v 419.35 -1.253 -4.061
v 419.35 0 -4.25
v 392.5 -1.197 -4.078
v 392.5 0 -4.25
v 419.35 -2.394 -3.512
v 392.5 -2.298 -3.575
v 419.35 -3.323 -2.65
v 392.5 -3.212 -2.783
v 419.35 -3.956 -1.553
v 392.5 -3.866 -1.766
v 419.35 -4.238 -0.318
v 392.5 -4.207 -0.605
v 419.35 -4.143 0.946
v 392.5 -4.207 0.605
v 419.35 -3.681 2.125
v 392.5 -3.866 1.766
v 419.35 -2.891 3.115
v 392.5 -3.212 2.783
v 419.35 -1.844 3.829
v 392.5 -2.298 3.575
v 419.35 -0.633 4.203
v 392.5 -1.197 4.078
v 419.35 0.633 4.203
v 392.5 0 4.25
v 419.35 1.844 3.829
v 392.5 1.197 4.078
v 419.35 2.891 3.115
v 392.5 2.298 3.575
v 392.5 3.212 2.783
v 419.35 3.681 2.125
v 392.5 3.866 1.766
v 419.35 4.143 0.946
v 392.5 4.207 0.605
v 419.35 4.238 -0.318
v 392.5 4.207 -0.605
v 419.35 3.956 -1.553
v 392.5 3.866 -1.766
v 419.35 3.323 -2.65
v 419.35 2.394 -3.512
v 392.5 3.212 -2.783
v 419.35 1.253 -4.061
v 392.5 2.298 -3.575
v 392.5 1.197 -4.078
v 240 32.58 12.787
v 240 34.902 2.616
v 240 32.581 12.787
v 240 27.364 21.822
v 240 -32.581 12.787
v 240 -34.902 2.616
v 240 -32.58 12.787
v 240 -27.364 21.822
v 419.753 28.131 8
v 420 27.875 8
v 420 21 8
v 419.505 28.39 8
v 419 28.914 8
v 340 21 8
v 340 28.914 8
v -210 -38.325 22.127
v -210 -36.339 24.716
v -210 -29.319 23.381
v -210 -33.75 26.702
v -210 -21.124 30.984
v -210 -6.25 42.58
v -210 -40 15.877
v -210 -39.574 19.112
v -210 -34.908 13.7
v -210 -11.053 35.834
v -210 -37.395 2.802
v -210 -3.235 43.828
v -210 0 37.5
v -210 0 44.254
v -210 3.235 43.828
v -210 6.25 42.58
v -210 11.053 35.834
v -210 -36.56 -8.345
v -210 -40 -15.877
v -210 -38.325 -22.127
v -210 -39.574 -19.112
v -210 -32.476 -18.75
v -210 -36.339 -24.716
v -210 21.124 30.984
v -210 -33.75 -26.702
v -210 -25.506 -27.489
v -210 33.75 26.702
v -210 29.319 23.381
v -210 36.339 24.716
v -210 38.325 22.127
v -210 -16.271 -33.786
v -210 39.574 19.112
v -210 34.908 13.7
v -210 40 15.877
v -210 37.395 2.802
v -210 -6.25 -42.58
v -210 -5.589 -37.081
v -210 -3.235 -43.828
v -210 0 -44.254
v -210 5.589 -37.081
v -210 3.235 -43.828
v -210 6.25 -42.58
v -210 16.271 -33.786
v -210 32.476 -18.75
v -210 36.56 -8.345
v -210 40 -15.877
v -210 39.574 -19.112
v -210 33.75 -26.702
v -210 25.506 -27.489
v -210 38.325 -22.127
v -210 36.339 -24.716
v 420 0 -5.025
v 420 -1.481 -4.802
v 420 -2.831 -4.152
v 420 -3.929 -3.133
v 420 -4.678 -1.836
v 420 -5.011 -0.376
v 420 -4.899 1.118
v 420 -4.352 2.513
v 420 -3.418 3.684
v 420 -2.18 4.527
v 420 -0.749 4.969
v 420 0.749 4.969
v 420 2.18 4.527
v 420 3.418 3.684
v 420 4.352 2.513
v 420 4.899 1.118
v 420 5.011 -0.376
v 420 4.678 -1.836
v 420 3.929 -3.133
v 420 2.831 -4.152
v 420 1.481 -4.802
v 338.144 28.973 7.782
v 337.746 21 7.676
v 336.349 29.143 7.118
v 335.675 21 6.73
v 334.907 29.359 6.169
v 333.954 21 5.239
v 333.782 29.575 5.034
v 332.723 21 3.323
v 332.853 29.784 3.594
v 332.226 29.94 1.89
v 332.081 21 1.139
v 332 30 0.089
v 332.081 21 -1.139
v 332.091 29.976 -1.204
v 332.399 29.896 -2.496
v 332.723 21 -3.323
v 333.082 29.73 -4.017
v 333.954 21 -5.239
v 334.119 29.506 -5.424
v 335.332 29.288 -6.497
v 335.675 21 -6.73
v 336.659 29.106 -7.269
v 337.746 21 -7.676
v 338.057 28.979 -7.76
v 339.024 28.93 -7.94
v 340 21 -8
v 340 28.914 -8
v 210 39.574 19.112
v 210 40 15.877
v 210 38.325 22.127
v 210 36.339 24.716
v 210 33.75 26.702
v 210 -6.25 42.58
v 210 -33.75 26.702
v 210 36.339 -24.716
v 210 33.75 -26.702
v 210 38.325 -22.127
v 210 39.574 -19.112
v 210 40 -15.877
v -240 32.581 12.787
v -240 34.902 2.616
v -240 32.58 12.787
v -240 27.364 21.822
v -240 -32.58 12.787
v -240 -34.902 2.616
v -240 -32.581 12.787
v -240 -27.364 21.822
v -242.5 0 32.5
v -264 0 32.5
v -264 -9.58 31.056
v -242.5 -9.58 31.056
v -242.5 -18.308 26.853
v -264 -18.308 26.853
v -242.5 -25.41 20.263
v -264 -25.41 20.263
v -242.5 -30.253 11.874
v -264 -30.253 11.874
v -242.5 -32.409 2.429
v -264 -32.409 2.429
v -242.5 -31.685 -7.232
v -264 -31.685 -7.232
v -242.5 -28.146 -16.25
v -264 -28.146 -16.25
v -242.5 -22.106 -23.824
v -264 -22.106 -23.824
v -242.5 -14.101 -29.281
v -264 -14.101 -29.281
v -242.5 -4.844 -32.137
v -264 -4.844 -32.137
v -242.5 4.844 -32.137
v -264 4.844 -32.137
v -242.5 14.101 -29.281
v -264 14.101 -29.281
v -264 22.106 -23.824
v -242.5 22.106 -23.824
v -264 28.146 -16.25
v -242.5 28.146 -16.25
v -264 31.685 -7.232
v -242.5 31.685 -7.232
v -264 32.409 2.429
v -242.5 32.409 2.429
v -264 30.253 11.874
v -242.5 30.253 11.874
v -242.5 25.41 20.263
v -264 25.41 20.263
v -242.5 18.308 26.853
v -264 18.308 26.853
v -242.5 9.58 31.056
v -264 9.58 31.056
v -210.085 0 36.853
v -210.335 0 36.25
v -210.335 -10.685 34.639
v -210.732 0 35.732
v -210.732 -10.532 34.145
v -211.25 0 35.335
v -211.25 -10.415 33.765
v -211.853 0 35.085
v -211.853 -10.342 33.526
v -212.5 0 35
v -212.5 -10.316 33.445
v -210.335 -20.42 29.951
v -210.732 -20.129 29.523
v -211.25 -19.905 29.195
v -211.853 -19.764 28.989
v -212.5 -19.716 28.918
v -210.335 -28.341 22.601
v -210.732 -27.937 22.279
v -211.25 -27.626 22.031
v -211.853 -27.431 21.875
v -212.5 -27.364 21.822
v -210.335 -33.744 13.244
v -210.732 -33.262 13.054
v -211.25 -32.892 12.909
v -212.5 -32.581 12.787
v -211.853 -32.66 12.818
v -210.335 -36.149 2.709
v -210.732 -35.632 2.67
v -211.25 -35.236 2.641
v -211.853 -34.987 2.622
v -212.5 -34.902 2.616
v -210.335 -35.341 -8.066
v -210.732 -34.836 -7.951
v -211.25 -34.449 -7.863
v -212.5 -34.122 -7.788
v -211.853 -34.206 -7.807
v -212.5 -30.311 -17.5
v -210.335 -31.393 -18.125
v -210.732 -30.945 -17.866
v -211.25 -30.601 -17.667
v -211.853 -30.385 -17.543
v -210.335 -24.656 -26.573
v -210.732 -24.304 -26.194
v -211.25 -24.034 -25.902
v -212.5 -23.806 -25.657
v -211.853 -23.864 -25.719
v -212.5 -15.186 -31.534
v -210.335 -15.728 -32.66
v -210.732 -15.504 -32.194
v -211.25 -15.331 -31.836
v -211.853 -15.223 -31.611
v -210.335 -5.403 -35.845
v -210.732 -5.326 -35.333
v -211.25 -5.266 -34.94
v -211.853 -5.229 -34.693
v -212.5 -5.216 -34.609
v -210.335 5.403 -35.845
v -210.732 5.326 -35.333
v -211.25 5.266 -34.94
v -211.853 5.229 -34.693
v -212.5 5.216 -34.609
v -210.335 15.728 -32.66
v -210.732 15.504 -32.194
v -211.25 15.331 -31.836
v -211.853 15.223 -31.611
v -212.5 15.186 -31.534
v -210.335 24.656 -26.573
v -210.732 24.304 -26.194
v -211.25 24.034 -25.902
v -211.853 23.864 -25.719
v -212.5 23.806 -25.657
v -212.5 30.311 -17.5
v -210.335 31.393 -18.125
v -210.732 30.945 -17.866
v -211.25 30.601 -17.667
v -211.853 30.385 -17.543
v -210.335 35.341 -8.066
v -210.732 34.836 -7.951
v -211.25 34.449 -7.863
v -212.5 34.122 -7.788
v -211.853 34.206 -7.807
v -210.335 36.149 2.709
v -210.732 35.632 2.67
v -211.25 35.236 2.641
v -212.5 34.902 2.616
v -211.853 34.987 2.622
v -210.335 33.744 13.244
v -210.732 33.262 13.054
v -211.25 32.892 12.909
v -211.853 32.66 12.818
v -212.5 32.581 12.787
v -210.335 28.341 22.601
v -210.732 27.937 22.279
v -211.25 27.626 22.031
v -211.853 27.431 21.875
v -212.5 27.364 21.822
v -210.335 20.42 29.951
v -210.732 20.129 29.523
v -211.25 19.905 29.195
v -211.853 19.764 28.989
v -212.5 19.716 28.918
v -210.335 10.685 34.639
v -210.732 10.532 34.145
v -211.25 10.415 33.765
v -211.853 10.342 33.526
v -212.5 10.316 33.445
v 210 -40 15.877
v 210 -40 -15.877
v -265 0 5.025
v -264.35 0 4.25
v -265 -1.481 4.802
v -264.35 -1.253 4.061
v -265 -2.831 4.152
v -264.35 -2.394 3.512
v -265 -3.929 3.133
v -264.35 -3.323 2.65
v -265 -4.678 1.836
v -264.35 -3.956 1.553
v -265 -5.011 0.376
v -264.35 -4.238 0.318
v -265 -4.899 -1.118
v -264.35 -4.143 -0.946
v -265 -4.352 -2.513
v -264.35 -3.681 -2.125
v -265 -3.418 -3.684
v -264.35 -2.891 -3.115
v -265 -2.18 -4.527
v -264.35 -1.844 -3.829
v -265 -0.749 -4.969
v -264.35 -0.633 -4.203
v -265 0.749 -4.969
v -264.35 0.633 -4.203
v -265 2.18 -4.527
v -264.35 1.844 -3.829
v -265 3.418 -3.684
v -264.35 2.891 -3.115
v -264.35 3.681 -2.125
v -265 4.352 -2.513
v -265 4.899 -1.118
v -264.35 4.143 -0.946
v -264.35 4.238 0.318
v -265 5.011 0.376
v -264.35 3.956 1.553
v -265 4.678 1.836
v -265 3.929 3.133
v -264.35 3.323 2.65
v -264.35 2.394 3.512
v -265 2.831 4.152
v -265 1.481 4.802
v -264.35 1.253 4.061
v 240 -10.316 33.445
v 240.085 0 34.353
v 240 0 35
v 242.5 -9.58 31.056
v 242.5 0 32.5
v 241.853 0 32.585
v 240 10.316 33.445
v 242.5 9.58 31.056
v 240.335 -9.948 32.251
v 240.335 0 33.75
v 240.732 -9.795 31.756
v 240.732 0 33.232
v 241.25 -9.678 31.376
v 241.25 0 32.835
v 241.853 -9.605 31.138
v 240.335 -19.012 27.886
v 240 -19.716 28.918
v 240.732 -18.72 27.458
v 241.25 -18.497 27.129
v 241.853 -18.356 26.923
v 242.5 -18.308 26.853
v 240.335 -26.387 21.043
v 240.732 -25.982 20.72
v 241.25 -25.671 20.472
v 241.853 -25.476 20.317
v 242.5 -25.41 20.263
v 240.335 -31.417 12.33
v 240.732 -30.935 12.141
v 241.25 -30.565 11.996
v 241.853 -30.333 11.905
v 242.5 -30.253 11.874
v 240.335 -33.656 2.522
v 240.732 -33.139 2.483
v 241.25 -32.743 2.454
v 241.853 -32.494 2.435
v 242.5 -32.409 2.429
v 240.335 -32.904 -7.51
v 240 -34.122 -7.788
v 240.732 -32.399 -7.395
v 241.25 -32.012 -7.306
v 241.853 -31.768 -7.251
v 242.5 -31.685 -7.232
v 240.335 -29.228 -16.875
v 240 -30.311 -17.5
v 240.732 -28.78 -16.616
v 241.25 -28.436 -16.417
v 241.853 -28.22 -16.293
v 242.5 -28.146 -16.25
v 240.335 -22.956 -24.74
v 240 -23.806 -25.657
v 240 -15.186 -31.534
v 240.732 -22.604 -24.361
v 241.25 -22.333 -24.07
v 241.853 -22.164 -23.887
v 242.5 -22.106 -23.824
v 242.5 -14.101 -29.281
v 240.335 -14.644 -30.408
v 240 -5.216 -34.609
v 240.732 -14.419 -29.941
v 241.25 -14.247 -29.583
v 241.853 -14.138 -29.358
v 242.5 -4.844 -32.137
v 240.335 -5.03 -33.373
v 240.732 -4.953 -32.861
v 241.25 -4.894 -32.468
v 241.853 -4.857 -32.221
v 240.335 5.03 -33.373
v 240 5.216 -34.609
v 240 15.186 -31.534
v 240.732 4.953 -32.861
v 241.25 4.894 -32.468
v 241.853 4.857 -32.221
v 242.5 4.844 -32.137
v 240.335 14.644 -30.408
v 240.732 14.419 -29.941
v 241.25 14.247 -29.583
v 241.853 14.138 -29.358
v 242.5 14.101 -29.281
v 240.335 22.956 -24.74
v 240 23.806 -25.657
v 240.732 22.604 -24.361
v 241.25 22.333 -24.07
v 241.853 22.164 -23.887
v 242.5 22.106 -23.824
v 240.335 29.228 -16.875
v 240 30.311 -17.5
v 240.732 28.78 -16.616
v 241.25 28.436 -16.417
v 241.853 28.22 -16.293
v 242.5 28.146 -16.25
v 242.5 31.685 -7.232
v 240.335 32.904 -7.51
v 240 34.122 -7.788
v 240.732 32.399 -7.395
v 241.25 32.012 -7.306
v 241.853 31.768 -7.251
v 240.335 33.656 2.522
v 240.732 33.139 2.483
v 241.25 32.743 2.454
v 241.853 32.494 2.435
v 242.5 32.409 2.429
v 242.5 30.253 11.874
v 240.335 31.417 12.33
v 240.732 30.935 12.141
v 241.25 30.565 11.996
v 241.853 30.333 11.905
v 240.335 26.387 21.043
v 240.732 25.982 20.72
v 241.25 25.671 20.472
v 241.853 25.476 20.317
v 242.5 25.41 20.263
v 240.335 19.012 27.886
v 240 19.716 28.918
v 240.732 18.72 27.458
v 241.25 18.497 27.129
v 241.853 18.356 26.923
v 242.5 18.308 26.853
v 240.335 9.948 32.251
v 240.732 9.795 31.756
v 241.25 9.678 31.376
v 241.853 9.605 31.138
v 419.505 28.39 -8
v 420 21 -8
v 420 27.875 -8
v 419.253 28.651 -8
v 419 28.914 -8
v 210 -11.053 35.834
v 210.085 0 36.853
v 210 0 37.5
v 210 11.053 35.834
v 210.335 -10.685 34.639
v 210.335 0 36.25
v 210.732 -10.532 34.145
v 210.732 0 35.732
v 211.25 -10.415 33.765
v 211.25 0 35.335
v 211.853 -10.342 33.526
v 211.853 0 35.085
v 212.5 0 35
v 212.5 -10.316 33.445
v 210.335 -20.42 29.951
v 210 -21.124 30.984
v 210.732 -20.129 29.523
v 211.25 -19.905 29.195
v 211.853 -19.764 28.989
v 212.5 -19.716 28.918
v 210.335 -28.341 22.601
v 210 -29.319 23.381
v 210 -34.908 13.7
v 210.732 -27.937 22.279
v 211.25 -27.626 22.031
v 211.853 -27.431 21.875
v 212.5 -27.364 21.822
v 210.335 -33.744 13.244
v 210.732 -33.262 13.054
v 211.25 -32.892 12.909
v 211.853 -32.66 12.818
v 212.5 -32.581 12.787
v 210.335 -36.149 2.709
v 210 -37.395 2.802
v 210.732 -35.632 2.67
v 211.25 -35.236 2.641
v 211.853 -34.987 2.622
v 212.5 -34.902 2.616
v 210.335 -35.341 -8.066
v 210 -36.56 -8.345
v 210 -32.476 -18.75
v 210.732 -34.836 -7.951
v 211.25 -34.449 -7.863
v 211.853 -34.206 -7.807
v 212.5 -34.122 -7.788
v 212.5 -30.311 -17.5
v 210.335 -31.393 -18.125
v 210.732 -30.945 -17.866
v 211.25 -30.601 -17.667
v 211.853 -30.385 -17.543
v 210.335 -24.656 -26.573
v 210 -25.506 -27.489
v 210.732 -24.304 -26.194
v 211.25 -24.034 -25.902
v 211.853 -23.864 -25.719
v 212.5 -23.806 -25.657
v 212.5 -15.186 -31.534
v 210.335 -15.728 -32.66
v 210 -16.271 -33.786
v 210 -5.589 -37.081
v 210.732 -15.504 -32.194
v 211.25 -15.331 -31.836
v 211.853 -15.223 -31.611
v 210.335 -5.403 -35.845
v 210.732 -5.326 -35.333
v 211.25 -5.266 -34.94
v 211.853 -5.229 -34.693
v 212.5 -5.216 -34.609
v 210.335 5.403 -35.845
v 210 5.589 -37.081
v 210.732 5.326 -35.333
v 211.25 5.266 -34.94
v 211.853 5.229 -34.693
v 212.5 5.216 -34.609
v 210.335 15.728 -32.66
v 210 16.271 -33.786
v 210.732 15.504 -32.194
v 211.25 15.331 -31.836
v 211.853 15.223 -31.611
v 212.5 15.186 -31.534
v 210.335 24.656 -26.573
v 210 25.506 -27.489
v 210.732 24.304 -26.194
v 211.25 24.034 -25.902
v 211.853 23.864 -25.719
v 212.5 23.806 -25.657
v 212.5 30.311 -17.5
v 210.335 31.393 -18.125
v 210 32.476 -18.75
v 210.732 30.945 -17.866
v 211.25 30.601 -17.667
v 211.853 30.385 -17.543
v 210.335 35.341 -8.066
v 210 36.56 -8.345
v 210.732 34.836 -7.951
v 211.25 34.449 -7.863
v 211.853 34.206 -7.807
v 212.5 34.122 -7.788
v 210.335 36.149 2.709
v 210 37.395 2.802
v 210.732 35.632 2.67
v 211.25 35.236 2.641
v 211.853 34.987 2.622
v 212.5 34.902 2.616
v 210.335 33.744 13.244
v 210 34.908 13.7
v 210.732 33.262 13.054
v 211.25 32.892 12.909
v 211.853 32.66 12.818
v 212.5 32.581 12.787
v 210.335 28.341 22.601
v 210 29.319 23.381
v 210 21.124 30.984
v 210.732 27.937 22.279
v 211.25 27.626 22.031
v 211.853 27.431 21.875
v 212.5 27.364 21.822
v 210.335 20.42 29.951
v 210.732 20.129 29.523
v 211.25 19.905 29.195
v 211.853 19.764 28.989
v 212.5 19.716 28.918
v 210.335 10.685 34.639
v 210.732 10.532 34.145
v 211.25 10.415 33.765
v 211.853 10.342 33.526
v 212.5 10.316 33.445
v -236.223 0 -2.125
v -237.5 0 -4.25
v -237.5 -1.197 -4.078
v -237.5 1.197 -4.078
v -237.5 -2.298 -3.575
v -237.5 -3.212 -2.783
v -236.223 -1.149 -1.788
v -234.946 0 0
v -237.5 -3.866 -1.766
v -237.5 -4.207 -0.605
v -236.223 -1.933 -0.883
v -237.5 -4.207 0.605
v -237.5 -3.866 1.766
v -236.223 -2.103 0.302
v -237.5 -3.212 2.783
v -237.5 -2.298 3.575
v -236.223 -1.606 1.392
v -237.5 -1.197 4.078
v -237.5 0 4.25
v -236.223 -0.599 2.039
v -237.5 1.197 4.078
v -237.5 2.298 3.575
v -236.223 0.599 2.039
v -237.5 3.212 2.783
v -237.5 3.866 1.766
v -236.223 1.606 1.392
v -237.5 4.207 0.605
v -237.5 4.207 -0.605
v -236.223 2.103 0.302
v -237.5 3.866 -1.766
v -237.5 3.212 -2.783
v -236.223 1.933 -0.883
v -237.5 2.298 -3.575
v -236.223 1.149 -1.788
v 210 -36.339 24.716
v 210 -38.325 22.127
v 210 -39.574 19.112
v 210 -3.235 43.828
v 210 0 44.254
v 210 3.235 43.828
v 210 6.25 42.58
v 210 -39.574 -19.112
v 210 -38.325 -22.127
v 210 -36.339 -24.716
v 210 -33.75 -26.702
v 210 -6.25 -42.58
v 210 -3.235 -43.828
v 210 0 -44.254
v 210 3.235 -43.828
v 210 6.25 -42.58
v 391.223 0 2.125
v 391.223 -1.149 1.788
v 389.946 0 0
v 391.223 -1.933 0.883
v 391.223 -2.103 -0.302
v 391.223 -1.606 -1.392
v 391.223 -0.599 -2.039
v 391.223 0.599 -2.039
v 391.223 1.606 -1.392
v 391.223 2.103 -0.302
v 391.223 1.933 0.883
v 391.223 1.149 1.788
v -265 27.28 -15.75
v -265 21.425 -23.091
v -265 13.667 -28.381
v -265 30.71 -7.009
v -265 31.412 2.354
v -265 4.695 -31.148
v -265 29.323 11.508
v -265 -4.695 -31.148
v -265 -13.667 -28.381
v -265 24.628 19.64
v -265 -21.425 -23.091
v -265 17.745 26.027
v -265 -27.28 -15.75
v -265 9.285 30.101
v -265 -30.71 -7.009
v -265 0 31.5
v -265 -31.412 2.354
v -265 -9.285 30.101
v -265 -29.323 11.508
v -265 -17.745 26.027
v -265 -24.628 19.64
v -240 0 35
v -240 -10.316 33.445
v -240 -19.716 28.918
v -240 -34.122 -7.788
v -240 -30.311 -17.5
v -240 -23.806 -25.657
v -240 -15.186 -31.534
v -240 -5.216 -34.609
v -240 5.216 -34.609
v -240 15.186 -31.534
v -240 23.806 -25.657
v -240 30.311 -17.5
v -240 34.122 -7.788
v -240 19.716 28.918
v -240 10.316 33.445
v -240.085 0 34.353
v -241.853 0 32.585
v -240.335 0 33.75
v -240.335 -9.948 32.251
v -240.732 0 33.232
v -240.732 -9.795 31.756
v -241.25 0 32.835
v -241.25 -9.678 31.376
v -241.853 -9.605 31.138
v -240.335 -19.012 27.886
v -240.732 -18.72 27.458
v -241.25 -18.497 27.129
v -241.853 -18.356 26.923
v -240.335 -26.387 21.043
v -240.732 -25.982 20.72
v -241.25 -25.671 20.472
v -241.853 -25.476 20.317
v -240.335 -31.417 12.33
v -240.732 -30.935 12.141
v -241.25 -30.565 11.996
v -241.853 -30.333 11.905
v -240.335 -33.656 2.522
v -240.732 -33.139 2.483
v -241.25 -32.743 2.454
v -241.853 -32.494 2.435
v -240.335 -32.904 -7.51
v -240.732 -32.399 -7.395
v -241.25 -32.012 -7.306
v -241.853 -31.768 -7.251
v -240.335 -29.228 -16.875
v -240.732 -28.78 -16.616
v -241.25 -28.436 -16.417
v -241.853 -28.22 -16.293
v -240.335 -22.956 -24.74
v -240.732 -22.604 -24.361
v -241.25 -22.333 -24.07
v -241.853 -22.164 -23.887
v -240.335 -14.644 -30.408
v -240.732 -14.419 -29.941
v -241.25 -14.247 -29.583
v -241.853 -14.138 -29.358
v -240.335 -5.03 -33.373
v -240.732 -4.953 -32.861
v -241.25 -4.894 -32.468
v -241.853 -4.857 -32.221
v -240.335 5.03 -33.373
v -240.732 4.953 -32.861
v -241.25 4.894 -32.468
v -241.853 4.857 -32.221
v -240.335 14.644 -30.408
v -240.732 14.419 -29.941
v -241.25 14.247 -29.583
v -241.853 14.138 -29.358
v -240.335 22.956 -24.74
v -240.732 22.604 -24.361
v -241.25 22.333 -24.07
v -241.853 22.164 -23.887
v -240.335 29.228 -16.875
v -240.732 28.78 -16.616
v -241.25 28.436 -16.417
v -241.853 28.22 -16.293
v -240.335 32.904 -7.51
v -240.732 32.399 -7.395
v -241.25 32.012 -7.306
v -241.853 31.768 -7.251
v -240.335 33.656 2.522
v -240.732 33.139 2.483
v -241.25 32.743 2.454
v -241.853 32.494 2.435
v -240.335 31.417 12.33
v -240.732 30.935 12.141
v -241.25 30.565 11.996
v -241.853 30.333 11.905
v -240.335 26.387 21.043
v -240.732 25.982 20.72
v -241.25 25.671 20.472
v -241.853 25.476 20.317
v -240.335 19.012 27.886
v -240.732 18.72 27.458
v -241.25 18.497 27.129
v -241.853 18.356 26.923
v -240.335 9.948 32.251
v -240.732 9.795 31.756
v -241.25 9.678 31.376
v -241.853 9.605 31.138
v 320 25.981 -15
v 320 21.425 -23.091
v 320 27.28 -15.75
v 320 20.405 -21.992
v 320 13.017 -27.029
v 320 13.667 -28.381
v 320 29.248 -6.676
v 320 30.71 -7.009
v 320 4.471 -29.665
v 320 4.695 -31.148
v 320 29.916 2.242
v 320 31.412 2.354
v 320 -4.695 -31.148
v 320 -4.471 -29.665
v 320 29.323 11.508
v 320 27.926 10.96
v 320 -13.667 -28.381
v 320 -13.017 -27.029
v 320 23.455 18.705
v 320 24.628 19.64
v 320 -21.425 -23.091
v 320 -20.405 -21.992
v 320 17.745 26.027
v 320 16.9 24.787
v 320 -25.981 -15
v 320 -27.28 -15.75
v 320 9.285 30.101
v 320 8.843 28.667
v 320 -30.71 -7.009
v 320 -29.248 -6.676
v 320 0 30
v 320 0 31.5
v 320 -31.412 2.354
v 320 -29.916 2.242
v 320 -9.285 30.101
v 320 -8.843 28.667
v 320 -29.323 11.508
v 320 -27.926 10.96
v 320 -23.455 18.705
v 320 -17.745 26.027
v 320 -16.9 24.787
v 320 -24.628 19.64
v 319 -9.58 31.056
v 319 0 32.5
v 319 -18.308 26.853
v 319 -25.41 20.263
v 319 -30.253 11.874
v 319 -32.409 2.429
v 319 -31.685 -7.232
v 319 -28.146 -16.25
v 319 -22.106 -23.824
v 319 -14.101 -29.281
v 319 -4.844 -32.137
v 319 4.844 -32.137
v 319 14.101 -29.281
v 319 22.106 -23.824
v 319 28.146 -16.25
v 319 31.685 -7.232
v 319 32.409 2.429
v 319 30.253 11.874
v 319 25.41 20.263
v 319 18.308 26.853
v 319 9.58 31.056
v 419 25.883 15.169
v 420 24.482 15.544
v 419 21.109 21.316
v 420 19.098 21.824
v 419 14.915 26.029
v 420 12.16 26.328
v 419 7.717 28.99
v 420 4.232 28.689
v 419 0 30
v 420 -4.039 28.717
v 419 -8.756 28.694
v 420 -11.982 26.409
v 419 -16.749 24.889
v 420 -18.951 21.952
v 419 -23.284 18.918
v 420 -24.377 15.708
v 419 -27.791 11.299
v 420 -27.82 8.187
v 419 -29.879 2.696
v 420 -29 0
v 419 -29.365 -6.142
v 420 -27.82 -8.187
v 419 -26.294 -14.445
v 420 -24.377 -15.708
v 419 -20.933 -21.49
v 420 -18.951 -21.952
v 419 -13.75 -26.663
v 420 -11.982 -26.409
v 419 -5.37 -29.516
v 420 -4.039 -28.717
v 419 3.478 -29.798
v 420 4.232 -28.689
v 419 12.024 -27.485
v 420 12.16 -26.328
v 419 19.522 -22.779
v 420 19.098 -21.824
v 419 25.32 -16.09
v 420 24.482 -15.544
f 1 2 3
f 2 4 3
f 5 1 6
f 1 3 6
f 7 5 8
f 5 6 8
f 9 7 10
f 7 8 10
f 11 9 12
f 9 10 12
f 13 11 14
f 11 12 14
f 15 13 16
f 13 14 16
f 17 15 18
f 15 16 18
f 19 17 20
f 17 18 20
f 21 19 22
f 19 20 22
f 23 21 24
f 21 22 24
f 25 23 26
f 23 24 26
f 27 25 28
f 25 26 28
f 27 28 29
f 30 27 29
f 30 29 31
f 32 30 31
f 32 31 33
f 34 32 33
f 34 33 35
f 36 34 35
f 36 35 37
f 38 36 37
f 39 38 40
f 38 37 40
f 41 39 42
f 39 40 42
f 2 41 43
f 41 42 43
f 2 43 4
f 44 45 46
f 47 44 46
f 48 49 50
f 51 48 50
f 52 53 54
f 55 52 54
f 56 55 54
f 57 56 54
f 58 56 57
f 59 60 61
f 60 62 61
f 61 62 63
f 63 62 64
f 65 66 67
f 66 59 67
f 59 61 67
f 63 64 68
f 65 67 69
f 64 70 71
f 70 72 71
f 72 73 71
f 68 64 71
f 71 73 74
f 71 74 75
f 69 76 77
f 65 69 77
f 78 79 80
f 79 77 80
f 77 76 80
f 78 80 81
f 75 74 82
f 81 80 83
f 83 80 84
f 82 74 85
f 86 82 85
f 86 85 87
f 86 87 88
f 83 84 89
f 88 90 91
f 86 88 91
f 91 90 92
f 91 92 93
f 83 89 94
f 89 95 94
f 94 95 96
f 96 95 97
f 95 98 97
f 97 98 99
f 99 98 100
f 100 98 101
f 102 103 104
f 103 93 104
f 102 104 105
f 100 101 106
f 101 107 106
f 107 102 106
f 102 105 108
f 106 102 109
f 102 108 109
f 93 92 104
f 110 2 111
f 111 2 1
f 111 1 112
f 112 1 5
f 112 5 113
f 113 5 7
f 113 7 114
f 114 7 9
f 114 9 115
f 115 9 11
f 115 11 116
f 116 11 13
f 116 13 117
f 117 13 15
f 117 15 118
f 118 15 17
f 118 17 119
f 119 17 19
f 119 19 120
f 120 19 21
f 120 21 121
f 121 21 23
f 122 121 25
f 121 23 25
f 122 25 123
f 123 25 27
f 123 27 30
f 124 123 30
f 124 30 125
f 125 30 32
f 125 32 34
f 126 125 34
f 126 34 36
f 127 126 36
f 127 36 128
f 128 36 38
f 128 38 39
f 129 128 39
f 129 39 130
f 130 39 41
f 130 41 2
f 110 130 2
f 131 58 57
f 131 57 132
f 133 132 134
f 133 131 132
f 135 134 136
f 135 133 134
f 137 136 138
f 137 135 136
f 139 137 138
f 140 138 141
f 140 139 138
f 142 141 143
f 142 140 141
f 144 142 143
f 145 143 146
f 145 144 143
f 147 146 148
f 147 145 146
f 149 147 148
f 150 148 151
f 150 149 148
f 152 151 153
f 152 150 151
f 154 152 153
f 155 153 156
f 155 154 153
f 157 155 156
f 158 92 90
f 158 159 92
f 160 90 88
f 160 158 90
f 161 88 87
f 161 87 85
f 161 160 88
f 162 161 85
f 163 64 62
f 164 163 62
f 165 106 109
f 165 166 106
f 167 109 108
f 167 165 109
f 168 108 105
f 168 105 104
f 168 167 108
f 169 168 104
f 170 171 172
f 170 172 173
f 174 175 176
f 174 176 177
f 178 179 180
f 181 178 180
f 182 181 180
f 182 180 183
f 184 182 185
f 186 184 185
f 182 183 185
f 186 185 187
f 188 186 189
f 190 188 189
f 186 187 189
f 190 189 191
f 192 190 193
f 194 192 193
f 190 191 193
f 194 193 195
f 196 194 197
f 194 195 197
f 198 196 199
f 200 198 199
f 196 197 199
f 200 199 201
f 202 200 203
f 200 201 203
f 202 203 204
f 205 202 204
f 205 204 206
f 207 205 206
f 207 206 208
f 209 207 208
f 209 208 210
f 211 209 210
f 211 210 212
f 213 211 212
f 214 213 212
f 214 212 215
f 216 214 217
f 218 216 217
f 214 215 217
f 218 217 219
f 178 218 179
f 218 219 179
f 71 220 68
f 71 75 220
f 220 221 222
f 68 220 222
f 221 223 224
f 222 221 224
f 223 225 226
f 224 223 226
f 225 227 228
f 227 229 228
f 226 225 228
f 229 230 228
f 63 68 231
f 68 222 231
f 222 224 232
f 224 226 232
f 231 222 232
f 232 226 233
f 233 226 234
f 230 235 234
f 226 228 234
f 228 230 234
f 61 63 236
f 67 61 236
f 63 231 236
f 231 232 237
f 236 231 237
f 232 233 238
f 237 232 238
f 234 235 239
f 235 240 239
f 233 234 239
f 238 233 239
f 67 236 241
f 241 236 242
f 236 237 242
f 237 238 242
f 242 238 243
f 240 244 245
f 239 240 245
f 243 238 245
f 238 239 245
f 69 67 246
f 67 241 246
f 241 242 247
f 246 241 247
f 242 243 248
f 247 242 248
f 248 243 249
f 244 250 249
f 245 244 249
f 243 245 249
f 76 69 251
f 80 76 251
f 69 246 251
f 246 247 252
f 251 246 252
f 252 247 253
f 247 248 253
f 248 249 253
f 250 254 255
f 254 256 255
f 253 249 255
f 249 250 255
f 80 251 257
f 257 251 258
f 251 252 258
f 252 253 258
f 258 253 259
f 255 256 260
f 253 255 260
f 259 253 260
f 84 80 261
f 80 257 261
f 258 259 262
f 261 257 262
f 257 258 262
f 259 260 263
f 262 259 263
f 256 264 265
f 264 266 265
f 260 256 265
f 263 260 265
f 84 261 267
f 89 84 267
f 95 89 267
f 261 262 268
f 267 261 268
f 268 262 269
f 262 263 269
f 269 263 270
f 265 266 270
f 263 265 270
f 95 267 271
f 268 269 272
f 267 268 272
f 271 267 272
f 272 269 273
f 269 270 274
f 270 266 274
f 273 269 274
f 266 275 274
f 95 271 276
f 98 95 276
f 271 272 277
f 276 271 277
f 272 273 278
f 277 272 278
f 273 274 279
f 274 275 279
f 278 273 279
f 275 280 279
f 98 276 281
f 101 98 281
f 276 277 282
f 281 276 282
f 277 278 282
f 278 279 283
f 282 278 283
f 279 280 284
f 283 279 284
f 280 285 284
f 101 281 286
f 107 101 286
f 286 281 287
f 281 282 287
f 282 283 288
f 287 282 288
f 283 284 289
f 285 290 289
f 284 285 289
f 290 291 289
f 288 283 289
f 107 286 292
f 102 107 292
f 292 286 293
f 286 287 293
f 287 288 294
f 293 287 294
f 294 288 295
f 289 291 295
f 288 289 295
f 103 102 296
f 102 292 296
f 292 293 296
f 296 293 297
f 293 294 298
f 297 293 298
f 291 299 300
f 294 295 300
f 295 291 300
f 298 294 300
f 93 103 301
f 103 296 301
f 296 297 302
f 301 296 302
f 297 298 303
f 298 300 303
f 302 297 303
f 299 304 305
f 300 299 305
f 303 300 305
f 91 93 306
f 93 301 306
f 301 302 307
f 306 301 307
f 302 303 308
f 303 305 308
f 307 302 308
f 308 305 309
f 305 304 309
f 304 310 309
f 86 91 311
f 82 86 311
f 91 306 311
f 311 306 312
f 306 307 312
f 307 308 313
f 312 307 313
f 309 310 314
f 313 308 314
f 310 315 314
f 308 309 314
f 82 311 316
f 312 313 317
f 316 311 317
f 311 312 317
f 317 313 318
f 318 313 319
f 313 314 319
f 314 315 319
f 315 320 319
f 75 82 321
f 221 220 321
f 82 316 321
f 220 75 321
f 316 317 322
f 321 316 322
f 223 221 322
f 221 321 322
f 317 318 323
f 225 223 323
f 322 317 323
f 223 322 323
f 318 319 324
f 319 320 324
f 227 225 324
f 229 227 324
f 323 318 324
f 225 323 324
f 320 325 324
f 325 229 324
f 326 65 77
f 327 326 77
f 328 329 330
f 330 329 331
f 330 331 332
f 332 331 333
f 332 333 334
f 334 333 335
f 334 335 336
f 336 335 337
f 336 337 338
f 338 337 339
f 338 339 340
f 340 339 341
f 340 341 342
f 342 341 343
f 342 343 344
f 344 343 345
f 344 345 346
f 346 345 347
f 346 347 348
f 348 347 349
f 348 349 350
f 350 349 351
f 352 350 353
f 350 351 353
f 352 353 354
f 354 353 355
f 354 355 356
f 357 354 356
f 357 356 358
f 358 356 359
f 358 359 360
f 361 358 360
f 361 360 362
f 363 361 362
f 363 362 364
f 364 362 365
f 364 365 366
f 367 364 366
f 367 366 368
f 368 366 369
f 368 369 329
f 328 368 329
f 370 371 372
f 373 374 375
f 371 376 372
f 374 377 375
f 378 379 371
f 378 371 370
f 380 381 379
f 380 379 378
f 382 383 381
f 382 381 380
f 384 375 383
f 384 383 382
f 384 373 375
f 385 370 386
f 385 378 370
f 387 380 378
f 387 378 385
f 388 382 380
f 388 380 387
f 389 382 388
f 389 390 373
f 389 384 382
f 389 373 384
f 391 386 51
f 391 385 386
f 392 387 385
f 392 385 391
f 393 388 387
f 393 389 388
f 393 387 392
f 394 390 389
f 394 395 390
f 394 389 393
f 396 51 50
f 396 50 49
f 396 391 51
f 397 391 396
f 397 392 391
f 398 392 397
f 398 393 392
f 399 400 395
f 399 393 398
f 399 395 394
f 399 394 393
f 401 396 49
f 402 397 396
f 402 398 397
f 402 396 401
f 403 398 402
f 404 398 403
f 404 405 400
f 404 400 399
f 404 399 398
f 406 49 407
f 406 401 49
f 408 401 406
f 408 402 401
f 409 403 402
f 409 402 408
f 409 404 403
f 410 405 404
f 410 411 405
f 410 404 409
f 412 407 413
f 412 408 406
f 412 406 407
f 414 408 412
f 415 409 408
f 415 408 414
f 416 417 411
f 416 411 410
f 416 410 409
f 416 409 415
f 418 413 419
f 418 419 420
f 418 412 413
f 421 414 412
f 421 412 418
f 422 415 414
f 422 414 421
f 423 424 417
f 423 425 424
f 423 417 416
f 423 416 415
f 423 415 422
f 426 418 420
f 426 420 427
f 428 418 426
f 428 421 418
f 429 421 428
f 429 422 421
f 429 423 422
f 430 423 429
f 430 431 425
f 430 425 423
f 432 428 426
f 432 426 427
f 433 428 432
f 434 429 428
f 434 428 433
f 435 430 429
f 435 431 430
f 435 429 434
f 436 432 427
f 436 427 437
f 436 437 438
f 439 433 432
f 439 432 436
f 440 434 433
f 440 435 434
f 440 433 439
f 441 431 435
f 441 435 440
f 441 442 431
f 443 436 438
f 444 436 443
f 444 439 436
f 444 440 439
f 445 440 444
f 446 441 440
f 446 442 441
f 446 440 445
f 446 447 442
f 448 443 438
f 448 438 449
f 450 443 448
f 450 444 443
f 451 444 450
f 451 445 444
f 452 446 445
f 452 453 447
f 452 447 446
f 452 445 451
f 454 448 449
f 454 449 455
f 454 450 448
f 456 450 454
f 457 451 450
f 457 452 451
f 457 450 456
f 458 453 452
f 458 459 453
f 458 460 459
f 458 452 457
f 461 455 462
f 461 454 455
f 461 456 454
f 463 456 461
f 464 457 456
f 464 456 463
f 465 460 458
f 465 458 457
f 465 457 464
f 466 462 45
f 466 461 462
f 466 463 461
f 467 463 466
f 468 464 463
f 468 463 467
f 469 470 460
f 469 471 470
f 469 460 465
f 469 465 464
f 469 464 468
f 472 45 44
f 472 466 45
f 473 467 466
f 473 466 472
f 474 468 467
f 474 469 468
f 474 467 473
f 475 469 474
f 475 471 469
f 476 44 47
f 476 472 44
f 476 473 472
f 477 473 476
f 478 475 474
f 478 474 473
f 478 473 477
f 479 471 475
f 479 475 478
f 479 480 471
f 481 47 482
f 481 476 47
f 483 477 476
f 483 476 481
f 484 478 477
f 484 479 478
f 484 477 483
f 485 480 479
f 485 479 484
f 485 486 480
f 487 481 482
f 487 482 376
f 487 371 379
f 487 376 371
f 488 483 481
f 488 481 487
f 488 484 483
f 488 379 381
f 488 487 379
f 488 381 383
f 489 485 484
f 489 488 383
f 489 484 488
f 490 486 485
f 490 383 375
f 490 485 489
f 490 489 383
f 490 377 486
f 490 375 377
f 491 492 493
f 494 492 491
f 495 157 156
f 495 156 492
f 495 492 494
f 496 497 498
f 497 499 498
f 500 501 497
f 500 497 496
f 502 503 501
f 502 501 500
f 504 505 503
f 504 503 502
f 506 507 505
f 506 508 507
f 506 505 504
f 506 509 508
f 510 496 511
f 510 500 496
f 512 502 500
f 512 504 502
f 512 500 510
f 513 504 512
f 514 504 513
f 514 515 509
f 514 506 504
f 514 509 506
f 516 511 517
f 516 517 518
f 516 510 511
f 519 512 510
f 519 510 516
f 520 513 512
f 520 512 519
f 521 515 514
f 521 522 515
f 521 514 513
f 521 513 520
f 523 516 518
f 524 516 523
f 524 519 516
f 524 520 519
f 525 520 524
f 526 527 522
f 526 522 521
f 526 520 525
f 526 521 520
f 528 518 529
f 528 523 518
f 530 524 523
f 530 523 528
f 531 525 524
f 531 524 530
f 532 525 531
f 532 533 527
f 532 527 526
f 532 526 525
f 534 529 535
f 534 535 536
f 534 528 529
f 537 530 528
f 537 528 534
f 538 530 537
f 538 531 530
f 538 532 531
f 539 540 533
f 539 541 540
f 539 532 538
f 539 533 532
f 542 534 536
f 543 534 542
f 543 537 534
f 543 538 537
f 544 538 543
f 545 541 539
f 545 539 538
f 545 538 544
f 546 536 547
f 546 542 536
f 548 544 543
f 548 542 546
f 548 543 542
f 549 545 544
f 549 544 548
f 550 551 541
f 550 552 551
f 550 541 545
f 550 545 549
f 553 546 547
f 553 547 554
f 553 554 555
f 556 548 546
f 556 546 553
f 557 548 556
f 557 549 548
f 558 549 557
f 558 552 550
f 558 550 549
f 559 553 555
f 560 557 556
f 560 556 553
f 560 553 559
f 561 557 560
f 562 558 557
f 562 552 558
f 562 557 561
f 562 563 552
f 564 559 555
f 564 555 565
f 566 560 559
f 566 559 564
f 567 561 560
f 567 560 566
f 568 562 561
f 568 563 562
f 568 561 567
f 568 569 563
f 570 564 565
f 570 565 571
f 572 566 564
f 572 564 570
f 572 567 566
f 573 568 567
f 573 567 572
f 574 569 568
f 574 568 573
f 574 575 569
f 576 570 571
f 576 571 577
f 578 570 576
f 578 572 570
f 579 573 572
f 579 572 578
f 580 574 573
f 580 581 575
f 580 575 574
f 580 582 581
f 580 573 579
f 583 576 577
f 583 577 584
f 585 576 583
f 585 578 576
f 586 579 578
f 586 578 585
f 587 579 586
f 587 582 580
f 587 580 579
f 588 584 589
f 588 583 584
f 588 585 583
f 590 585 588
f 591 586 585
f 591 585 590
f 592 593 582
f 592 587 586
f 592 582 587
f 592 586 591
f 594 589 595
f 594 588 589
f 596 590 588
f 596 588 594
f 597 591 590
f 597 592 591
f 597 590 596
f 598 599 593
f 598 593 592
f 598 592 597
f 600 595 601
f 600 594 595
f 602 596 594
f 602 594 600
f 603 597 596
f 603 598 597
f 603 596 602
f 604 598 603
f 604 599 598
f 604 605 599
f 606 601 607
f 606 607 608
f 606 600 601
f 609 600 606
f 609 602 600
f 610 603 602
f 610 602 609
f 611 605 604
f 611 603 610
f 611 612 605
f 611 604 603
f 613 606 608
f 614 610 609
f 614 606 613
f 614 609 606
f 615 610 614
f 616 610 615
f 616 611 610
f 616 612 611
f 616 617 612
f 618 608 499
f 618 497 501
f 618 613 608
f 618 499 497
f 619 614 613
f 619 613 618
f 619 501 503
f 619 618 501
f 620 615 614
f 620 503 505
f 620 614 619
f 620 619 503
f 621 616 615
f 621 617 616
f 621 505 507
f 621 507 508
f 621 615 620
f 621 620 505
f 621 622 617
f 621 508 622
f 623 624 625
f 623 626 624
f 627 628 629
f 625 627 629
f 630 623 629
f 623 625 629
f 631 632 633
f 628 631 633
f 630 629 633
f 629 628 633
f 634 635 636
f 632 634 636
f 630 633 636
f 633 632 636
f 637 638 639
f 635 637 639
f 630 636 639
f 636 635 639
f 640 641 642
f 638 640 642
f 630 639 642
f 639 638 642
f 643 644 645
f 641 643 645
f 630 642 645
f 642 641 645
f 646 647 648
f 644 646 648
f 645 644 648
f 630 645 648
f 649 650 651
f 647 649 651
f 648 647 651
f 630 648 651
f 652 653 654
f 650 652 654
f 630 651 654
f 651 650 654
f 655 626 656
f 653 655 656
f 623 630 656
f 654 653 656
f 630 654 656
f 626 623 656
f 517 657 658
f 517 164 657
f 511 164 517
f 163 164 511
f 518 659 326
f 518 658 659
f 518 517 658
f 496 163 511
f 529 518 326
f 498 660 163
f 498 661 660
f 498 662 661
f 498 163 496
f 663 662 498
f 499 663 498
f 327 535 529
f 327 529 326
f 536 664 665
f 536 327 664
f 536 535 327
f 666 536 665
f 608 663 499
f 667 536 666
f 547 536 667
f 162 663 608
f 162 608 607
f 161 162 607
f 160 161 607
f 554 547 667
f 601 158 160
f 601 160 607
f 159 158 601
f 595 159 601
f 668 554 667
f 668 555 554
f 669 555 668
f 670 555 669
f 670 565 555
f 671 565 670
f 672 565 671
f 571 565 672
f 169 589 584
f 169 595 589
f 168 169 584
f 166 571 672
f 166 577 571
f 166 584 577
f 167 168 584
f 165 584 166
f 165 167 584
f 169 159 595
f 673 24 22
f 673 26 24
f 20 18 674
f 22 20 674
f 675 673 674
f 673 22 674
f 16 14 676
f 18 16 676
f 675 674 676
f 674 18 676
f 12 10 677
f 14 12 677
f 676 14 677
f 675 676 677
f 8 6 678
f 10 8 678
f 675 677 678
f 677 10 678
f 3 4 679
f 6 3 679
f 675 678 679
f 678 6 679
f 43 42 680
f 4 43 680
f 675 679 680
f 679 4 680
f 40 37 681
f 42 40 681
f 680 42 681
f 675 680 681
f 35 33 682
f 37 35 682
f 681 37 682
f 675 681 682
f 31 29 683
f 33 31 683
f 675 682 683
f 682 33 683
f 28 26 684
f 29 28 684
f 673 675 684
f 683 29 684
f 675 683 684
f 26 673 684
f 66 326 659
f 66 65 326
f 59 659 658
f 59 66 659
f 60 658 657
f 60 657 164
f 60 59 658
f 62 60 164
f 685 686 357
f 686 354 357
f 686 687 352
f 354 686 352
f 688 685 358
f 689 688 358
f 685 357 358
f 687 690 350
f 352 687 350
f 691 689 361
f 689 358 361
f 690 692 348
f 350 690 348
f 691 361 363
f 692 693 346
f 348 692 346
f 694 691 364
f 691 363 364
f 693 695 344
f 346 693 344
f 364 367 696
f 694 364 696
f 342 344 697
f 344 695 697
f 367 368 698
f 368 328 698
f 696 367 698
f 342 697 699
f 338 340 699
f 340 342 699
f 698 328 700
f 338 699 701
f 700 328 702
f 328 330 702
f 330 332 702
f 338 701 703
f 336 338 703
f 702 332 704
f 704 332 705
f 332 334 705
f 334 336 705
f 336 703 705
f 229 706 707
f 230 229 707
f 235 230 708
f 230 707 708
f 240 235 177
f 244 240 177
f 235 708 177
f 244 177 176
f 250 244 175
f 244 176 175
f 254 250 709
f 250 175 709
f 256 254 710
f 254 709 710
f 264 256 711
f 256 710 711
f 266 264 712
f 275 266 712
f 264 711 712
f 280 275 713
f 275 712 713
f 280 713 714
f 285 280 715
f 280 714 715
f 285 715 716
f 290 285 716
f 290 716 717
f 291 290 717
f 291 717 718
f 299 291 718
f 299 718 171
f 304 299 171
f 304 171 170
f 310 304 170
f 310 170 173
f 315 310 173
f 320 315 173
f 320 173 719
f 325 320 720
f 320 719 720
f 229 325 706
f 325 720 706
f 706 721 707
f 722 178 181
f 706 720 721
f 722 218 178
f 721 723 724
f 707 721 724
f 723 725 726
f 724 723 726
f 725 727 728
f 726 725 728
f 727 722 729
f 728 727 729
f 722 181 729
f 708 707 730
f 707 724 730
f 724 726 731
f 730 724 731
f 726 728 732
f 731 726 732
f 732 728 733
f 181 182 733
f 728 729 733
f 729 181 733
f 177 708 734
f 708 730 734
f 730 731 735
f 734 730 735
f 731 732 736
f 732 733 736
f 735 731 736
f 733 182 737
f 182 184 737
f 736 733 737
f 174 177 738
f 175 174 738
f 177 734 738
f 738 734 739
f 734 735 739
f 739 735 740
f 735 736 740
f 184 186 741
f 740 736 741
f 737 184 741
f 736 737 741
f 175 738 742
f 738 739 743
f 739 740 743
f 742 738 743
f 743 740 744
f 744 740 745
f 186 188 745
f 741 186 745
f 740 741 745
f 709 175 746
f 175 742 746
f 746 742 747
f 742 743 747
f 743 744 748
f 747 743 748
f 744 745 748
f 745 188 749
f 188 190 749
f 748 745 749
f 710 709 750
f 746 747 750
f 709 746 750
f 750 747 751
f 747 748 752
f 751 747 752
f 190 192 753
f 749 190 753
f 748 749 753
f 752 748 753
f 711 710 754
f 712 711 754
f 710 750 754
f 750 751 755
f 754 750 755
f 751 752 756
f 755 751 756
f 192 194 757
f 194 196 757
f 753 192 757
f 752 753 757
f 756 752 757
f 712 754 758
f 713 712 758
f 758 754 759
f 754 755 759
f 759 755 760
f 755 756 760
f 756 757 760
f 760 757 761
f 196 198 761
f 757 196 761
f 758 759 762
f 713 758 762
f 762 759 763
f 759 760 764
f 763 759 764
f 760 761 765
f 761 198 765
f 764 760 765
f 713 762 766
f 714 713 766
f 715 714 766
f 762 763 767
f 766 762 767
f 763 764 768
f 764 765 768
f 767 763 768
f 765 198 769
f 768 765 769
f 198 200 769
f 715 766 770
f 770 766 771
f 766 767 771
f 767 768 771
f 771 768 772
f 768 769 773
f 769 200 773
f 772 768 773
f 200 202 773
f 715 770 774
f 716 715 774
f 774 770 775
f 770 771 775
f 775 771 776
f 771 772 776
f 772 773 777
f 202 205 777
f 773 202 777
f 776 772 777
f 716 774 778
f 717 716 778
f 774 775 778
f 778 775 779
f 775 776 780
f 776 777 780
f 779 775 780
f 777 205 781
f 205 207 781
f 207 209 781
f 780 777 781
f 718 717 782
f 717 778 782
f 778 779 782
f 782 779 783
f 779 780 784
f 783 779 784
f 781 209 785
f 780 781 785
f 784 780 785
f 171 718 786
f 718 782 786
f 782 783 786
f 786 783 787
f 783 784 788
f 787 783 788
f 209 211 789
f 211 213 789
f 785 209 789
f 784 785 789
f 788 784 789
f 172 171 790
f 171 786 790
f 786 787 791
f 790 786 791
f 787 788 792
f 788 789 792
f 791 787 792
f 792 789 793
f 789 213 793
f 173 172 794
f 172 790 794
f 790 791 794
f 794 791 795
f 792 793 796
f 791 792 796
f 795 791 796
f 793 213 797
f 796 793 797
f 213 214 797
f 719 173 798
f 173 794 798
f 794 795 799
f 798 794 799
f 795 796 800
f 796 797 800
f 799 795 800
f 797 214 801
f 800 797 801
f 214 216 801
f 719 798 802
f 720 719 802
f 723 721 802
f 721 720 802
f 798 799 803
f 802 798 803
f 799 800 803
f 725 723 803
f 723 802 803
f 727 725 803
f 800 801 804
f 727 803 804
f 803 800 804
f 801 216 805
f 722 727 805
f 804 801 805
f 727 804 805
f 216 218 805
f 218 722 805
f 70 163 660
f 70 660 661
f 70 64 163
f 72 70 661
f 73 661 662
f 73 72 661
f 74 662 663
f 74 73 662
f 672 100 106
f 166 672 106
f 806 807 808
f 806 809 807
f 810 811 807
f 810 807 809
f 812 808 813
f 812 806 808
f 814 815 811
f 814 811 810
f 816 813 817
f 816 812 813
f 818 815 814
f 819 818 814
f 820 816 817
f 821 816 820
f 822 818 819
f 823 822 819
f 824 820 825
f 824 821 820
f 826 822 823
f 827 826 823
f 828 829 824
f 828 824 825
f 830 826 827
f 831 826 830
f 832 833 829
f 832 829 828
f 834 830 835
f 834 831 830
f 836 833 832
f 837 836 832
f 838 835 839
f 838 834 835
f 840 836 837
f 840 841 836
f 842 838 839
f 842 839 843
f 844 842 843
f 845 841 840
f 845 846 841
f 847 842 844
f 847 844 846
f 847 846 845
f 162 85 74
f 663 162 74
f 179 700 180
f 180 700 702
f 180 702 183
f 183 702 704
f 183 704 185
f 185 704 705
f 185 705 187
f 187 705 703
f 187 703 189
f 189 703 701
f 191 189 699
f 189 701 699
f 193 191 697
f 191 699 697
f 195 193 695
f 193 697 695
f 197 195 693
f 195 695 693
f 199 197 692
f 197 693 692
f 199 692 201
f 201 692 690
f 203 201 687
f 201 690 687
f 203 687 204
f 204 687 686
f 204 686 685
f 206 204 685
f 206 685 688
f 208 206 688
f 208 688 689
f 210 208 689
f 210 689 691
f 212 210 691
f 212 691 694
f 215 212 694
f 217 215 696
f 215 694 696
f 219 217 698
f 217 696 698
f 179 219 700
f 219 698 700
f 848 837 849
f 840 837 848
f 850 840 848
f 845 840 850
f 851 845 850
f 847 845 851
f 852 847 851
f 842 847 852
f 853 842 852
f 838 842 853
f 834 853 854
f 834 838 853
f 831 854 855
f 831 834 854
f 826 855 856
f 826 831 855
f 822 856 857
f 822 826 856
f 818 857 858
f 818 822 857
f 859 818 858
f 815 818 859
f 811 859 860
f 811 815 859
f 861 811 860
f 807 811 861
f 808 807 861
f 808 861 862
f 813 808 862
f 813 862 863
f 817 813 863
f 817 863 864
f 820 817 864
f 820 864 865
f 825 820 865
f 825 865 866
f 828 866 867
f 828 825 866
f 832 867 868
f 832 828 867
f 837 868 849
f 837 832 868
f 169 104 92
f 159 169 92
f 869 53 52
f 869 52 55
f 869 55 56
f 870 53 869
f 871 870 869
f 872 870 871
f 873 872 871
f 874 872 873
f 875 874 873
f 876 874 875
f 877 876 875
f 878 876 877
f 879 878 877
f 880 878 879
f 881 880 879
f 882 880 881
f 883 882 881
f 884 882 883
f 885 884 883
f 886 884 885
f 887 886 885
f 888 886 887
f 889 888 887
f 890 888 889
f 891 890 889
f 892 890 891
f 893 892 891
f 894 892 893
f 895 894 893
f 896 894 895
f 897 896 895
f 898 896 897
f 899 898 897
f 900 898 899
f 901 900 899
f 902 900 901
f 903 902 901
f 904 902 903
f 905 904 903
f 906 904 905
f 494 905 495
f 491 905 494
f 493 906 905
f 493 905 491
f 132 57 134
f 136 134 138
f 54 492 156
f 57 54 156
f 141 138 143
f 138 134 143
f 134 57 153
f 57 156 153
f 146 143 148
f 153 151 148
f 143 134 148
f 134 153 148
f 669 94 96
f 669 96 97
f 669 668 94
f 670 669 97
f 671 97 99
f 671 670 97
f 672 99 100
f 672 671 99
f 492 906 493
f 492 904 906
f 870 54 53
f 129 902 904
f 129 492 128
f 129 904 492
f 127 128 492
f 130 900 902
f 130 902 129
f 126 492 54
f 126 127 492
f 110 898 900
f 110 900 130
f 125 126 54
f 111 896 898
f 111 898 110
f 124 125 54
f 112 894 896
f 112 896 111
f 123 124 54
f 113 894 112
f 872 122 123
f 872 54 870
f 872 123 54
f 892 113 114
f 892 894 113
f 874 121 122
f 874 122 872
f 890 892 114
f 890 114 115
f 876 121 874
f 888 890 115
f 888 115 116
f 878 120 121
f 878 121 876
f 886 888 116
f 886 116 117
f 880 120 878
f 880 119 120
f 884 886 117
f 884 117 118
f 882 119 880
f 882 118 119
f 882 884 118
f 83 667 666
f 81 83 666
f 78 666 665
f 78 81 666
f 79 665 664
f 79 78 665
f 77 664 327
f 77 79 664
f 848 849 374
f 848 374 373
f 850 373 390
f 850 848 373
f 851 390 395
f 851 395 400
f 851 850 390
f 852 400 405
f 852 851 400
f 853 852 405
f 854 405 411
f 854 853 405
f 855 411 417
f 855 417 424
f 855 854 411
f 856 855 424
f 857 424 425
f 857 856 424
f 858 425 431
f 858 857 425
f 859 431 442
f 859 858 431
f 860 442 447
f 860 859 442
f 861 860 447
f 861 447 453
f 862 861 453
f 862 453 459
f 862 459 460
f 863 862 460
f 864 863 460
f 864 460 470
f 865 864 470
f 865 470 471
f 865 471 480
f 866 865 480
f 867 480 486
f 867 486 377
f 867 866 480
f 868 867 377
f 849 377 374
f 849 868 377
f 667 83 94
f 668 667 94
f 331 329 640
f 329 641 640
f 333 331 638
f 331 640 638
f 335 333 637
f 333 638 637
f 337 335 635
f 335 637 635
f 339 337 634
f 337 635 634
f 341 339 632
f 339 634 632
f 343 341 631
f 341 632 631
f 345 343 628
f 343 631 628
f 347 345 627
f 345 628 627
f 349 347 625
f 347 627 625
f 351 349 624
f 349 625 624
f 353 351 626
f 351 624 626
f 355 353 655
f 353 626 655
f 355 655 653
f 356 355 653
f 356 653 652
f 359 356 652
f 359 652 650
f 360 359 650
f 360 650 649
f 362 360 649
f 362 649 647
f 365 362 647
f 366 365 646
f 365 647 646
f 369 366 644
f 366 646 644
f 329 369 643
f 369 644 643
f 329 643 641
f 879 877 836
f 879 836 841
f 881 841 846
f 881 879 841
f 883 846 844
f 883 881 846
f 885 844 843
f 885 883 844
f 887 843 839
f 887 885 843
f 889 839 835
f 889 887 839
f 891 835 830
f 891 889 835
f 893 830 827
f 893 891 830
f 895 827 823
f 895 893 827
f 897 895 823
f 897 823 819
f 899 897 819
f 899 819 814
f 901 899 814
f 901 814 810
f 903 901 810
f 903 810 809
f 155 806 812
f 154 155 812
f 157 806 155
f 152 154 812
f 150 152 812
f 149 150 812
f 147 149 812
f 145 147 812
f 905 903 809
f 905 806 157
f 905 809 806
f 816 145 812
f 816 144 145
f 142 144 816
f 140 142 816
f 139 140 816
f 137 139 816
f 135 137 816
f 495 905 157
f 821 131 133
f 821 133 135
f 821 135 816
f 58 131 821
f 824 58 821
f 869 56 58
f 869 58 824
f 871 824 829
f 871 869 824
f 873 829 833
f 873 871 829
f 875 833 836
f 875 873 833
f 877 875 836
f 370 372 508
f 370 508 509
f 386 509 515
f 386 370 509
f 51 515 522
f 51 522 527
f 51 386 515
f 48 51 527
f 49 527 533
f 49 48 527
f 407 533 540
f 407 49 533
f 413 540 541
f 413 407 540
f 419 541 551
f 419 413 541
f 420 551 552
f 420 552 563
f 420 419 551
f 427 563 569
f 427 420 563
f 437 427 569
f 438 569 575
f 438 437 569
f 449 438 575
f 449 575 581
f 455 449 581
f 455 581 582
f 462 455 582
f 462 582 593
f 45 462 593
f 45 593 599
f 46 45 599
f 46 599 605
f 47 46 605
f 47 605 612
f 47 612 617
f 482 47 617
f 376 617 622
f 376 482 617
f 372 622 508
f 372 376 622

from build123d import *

# Parameters (mm, degrees)
BOSS_EXTRUDE3_DEPTH                    = 210
FILLET1_R                              = 2.5
FILLET2_R                              = 12.5
CHAMFER1_SIZE                          = 1
M10_TAPPED_HOLE1_D                     = 8.5
M10_TAPPED_HOLE1_DEPTH                 = 27.5
M10_TAPPED_HOLE1_CSINK_D               = 10.05
M10_TAPPED_HOLE1_CSINK_ANGLE           = 100
M10_TAPPED_HOLE1_TIP                   = 2.553657631
M10_TAPPED_HOLE1_ON_FACE_2_D           = 8.5
M10_TAPPED_HOLE1_ON_FACE_2_DEPTH       = 27.5
M10_TAPPED_HOLE1_ON_FACE_2_CSINK_D     = 10.05
M10_TAPPED_HOLE1_ON_FACE_2_CSINK_ANGLE = 100
M10_TAPPED_HOLE1_ON_FACE_2_TIP         = 2.553657631
CUT_EXTRUDE1_DEPTH                     = 9


with BuildPart() as part:
    # Sketch1 → Boss-Extrude3 (new, symmetric)
    with BuildSketch(Plane(origin=(0, 0, 0), x_dir=(0, 0, -1), z_dir=(1, 0, 0))):
        Polygon((23.094010768, -40), (46.188021535, 0), (23.094010768, 40), (-23.094010768, 40), (-46.188021535, 0), (-23.094010768, -40), align=None)
    extrude(amount=BOSS_EXTRUDE3_DEPTH, both=True)

    # Sketch3 → Revolve1 (revolve)
    with BuildSketch(Plane.XY, mode=Mode.PRIVATE) as revolve1_sk:
        Polygon((-210, 35), (-240, 35), (-240, 32.5), (-265, 32.5), (-265, 0), (-210, 0), align=None)
        Polygon((210, 35), (240, 35), (240, 32.5), (320, 32.5), (320, 30), (420, 30), (420, 0), (210, 0), align=None)
    revolve(revolve1_sk.sketch.rotate(Axis((-265, 0, 0), (1, 0, 0)), 90), axis=Axis((-265, 0, 0), (1, 0, 0)))

    # Fillet1
    fillet1_edges = [part.edges().sort_by_distance(p)[0] for p in [
        (-210, 0, -35),
        (-240, 0, -32.5),
        (210, 0, -35),
        (240, 0, -32.5),
    ]]
    fillet(fillet1_edges, radius=FILLET1_R - 0.0001)  # a hair under: the kernel refuses the full size

    # Fillet2
    fillet2_edges = [part.edges().sort_by_distance(p)[0] for p in [
        (0, -40, 23.094010768),
        (0, 0, 46.188021535),
        (0, 40, 23.094010768),
        (0, 40, -23.094010768),
        (0, 0, -46.188021535),
        (0, -40, -23.094010768),
    ]]
    fillet(fillet2_edges, radius=FILLET2_R)

    # Chamfer1
    chamfer1_edges = [part.edges().sort_by_distance(p)[0] for p in [
        (-265, 0, -32.5),
        (320, 0, -32.5),
        (420, 0, -30),
    ]]
    chamfer(chamfer1_edges, length=CHAMFER1_SIZE)

    # M10 Tapped Hole1
    with Locations(Plane(origin=(-265, 0, 0), x_dir=(0, 0, -1), z_dir=(-1, 0, 0))):
        with Locations((0, 0)):
            CounterSinkHole(M10_TAPPED_HOLE1_D / 2, M10_TAPPED_HOLE1_CSINK_D / 2, depth=M10_TAPPED_HOLE1_DEPTH, counter_sink_angle=M10_TAPPED_HOLE1_CSINK_ANGLE)
            with Locations((0, 0, -(M10_TAPPED_HOLE1_DEPTH + M10_TAPPED_HOLE1_TIP / 2))):  # 118° drill point
                Cone(0, M10_TAPPED_HOLE1_D / 2, M10_TAPPED_HOLE1_TIP, mode=Mode.SUBTRACT)

    # M10 Tapped Hole1 on face 2
    with Locations(Plane(origin=(420, 0, 0), x_dir=(0, 0, 1), z_dir=(1, 0, 0))):
        with Locations((0, 0)):
            CounterSinkHole(M10_TAPPED_HOLE1_ON_FACE_2_D / 2, M10_TAPPED_HOLE1_ON_FACE_2_CSINK_D / 2, depth=M10_TAPPED_HOLE1_ON_FACE_2_DEPTH, counter_sink_angle=M10_TAPPED_HOLE1_ON_FACE_2_CSINK_ANGLE)
            with Locations((0, 0, -(M10_TAPPED_HOLE1_ON_FACE_2_DEPTH + M10_TAPPED_HOLE1_ON_FACE_2_TIP / 2))):  # 118° drill point
                Cone(0, M10_TAPPED_HOLE1_ON_FACE_2_D / 2, M10_TAPPED_HOLE1_ON_FACE_2_TIP, mode=Mode.SUBTRACT)

    # Sketch7 → Cut-Extrude1 (cut)
    with BuildSketch(Plane(origin=(0, 30, 0), x_dir=(1, 0, 0), z_dir=(0, 1, 0))):
        with BuildLine():
            Line((420, -8), (340, -8))
            ThreePointArc((340, -8), (332, 0), (340, 8))
            Line((340, 8), (420, 8))
            ThreePointArc((420, 8), (428, 0), (420, -8))
        make_face()
    extrude(amount=-CUT_EXTRUDE1_DEPTH, mode=Mode.SUBTRACT)


solid = part.part
